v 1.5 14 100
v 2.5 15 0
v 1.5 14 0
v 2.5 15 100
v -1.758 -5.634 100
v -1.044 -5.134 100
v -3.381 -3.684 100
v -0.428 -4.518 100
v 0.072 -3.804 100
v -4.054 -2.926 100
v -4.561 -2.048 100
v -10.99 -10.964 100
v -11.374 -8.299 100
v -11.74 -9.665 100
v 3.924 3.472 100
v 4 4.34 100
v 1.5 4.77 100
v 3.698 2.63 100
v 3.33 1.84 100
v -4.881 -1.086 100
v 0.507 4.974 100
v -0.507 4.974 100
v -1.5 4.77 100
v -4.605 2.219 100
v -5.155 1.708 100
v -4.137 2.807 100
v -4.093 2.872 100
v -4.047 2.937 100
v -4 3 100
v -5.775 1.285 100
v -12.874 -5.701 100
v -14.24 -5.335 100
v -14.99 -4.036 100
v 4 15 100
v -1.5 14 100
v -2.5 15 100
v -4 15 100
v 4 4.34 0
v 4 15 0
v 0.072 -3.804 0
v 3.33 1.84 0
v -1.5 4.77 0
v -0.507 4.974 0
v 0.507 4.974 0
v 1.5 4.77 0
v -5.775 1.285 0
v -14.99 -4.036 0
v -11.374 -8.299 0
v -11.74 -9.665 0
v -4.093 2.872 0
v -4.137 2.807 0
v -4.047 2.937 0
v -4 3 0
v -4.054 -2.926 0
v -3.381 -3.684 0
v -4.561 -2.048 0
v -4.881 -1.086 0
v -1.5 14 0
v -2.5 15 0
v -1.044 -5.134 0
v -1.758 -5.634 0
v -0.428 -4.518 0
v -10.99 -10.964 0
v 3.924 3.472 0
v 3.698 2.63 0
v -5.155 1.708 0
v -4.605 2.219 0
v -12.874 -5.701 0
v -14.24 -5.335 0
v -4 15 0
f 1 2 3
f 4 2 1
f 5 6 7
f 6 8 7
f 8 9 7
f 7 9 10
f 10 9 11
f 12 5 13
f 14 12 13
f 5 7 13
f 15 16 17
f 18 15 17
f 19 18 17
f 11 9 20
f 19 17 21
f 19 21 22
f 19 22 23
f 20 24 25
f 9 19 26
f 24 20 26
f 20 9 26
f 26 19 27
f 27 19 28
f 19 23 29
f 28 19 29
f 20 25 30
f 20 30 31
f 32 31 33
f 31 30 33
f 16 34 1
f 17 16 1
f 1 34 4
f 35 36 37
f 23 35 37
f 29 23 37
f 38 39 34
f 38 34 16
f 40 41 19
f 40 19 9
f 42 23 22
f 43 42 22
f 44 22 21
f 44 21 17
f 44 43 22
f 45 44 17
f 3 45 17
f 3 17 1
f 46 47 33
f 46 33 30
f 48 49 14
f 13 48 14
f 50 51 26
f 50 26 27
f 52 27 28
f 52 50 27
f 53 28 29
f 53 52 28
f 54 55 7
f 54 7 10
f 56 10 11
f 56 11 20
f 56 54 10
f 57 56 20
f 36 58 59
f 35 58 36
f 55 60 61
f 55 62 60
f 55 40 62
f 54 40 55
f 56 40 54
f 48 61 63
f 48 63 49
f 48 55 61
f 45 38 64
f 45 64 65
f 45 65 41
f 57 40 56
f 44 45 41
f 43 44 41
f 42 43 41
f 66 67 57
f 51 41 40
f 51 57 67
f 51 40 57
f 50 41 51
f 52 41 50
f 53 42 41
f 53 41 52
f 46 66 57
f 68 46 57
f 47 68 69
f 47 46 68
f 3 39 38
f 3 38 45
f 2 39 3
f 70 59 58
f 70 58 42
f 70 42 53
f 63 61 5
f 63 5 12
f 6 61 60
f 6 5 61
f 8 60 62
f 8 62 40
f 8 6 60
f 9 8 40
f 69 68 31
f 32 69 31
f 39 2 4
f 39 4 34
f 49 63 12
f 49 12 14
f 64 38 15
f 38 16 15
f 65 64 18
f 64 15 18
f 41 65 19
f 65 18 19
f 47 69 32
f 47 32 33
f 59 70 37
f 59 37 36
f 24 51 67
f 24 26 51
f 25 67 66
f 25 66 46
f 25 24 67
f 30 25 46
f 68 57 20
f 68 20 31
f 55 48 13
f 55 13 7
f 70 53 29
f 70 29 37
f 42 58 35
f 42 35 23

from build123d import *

# Parameters (mm, degrees)
EXTRUDE_1_DEPTH     = 100
CUT_EXTRUDE_2_DEPTH = 103.22383051
FILLET_2_R          = 5
CHAMFER_1_SIZE      = 1


with BuildPart() as part:
    # 草图2 → 凸台-拉伸1 (new body)
    with BuildSketch(Plane.XY):
        with BuildLine():
            Line((1.5, 4.769696007), (1.5, 15))
            Line((1.5, 15), (4, 15))
            Line((4, 15), (4, 3))
            ThreePointArc((4, 3), (4.330127019, -2.5), (-0.598076211, -4.964101615))
            Line((-0.598076211, -4.964101615), (-10.990381057, -10.964101615))
            Line((-10.990381057, -10.964101615), (-12.240381057, -8.799038106))
            Line((-12.240381057, -8.799038106), (-3.38067791, -3.683886109))
            ThreePointArc((-3.38067791, -3.683886109), (-4.330127019, -2.5), (-4.88067791, -1.085809898))
            Line((-4.88067791, -1.085809898), (-13.740381057, -6.200961894))
            Line((-13.740381057, -6.200961894), (-14.990381057, -4.035898385))
            Line((-14.990381057, -4.035898385), (-4.598076211, 1.964101615))
            ThreePointArc((-4.598076211, 1.964101615), (-4.330127019, 2.5), (-4, 3))
            Line((-4, 3), (-4, 15))
            Line((-4, 15), (-1.5, 15))
            Line((-1.5, 15), (-1.5, 4.769696007))
            ThreePointArc((-1.5, 4.769696007), (0, 5), (1.5, 4.769696007))
        make_face()
    extrude(amount=EXTRUDE_1_DEPTH)

    # 草图5 → 切除-拉伸2 (cut, through all)
    with BuildSketch(Plane.XY.offset(100)):
        with BuildLine():
            Line((4, 3), (-0.598076211, -4.964101615))
            ThreePointArc((-0.598076211, -4.964101615), (4.330127019, -2.5), (4, 3))
        make_face()
    extrude(amount=-CUT_EXTRUDE_2_DEPTH, mode=Mode.SUBTRACT)

    # 圆角2
    fillet_2_edges = [part.edges().sort_by_distance(p)[0] for p in [
        (4, 3, 50),
        (-0.598076211, -4.964101615, 50),
        (-4.598076211, 1.964101615, 50),
    ]]
    fillet(fillet_2_edges, radius=FILLET_2_R)

    # 倒角1
    chamfer_1_edges = [part.edges().sort_by_distance(p)[0] for p in [
        (-1.5, 15, 50),
        (1.5, 15, 50),
        (-12.240381057, -8.799038106, 50),
        (-13.740381057, -6.200961894, 50),
    ]]
    chamfer(chamfer_1_edges, length=CHAMFER_1_SIZE)


solid = part.part
